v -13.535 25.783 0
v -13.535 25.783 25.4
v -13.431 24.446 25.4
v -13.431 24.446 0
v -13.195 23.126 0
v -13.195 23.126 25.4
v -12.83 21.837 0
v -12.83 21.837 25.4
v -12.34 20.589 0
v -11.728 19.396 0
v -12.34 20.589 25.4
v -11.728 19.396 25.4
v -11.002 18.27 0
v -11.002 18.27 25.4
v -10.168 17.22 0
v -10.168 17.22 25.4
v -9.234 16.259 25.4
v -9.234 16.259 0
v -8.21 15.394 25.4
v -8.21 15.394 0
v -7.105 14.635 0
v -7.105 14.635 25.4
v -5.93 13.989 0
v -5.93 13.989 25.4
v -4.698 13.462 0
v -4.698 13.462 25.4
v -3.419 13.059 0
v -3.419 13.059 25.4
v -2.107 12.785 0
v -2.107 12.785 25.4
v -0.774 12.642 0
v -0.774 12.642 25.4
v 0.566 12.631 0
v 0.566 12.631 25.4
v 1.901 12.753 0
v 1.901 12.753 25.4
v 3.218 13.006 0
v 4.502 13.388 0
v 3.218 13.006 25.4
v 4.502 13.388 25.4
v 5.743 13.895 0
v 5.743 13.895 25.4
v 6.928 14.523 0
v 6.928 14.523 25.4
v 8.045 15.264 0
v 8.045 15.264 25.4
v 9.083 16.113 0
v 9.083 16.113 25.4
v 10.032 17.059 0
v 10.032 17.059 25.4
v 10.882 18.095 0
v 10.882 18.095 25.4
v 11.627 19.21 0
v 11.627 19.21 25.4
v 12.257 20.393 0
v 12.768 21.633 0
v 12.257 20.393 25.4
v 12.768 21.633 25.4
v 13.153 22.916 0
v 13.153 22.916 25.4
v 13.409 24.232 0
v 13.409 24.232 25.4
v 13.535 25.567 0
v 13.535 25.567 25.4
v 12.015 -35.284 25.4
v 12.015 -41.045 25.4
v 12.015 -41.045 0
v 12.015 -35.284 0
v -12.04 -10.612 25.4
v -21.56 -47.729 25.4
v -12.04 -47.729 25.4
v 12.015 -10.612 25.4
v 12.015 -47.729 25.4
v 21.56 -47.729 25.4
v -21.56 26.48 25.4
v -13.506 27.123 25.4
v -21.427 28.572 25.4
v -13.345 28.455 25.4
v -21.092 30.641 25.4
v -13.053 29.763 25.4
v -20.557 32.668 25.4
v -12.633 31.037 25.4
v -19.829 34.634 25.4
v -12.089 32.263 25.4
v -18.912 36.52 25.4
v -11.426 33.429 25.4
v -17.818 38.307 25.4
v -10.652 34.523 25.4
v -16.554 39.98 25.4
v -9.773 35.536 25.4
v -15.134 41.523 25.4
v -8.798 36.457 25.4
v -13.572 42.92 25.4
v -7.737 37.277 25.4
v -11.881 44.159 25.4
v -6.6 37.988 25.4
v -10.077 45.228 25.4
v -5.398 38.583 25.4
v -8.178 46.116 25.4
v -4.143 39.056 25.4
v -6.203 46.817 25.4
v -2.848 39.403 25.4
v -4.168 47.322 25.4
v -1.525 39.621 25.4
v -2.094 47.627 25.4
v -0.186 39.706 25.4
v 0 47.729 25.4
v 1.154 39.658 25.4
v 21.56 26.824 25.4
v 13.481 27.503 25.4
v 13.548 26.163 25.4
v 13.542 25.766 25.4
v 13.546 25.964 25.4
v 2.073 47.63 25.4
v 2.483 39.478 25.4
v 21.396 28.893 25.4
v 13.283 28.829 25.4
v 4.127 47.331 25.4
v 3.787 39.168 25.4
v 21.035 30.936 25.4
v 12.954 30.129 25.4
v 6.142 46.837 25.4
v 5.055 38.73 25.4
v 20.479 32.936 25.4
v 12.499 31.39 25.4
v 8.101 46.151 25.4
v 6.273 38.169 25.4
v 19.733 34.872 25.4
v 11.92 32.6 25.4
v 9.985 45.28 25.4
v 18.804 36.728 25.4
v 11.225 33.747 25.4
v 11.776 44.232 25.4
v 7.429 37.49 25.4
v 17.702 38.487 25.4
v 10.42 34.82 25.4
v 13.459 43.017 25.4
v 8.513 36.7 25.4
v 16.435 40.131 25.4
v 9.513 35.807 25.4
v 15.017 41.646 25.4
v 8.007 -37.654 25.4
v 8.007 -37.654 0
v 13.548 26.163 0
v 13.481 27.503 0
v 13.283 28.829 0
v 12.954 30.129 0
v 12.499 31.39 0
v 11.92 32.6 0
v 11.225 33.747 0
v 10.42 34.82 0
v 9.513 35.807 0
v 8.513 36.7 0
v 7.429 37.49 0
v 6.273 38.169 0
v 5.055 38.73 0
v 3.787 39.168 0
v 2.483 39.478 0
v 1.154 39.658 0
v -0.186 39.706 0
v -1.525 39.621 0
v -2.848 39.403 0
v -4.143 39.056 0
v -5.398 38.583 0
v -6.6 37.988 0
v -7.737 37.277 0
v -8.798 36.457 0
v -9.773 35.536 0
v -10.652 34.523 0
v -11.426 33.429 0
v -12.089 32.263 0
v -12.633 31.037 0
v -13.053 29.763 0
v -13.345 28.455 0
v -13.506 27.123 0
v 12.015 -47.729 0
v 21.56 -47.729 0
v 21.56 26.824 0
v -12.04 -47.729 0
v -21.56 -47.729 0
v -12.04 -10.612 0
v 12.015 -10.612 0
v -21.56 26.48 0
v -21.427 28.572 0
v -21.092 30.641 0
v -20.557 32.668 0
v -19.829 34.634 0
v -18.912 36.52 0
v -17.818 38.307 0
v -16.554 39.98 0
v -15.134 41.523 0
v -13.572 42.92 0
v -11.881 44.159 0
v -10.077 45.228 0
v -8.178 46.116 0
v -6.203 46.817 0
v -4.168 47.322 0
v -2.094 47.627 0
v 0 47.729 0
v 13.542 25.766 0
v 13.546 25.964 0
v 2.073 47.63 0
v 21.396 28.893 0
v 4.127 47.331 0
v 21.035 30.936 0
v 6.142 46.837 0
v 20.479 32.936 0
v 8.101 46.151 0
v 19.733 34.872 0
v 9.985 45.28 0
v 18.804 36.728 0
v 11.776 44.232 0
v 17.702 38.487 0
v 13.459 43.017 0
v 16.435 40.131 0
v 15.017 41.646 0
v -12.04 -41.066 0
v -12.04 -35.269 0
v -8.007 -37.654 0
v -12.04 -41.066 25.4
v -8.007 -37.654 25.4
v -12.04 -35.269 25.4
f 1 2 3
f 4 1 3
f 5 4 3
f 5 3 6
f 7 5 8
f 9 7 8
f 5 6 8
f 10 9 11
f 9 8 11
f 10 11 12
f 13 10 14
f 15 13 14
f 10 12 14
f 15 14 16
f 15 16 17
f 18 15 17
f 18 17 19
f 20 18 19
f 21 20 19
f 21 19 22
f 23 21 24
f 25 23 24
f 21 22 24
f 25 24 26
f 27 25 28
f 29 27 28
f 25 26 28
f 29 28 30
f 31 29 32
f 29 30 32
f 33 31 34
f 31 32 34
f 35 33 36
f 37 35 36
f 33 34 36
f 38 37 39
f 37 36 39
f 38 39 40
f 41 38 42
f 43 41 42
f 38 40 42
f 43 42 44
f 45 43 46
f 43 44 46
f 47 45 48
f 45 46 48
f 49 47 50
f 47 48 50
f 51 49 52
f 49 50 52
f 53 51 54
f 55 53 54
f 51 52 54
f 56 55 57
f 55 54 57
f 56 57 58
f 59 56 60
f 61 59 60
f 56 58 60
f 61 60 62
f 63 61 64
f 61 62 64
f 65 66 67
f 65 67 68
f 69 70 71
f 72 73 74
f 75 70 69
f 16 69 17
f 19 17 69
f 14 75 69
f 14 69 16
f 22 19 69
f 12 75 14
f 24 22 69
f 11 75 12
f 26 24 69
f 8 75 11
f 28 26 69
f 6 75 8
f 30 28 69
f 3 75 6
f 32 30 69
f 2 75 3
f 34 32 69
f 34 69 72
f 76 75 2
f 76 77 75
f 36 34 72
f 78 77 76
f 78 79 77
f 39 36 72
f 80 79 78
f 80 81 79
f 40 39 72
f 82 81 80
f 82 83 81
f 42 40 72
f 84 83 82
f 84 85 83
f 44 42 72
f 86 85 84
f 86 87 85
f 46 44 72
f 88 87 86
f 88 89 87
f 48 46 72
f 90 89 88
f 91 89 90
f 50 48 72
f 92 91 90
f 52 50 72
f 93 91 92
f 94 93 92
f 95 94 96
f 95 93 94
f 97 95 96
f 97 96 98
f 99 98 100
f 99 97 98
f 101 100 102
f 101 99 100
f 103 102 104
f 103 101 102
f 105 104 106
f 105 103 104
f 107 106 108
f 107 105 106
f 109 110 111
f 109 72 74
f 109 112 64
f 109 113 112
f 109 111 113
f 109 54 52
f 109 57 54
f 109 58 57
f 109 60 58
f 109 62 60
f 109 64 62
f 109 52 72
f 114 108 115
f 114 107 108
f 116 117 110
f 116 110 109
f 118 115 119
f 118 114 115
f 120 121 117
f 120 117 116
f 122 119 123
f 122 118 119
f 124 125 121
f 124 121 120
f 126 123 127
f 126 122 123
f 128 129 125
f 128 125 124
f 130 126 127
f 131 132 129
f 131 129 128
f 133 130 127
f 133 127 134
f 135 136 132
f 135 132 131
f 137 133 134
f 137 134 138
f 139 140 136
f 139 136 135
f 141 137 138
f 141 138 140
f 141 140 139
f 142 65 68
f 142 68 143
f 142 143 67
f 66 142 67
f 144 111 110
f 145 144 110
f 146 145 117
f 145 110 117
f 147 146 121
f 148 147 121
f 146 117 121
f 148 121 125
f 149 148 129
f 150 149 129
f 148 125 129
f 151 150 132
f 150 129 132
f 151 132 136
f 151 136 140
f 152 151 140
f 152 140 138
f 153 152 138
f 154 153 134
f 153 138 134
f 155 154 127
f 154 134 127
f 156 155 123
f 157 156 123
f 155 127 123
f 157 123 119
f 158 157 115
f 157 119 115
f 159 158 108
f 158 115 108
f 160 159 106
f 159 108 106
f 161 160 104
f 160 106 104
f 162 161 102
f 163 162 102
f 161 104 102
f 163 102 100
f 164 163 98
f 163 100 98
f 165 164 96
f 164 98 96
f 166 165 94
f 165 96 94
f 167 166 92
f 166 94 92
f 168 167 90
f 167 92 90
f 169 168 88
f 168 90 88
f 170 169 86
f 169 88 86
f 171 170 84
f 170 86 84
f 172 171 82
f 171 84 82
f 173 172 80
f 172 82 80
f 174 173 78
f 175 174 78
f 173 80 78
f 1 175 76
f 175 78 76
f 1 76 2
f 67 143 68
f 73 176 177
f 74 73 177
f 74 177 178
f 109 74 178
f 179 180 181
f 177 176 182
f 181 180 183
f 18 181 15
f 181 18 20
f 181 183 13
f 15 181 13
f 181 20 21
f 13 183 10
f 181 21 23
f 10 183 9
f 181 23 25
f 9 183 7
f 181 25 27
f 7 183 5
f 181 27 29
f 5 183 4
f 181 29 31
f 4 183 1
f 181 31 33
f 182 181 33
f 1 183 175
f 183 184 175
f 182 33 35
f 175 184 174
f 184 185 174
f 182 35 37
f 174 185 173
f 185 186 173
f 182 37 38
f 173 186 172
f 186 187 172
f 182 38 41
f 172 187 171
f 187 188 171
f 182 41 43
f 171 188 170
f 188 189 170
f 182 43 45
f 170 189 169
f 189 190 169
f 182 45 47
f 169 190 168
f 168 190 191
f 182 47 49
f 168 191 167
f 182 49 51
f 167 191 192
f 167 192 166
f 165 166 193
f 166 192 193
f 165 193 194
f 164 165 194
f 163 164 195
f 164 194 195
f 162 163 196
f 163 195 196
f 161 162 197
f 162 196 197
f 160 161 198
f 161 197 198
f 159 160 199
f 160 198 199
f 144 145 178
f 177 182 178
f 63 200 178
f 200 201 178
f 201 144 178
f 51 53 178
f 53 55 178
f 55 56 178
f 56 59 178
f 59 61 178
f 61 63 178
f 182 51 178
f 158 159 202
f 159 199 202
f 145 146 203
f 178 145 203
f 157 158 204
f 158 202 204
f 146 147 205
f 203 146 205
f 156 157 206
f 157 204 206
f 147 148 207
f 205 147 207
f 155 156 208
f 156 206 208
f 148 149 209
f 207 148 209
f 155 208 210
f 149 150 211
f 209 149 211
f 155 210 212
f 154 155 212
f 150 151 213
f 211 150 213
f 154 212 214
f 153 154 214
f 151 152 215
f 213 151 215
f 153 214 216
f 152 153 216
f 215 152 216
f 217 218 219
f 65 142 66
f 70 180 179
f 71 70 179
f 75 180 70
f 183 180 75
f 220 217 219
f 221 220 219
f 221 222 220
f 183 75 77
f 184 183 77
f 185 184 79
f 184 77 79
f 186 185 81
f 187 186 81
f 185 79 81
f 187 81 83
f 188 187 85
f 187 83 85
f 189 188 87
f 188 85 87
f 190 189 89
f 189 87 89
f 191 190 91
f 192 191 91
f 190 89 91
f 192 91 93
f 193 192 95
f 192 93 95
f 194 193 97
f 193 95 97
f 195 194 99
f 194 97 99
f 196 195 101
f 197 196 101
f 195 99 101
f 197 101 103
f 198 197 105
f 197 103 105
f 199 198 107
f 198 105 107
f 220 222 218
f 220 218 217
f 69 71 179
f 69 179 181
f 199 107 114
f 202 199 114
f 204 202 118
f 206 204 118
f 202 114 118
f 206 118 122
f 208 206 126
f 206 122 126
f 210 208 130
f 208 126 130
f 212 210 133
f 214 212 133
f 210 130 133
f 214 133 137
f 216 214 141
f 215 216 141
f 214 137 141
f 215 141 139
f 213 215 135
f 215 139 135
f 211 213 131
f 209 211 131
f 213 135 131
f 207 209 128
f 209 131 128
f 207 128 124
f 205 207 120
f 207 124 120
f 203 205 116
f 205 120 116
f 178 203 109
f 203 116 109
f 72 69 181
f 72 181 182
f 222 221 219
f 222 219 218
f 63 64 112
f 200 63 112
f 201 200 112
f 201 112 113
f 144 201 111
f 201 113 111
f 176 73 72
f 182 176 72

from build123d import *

# Parameters (mm, degrees)
F0_W     = 43.1191921234
F0_H     = 95.4580008984
F1_DEPTH = 25.4
F2_W     = 24.0557342768
F2_H     = 37.1173806489
F3_DEPTH = 25.4
F5_DEPTH = 25.4
F7_DEPTH = 25.4


with BuildPart() as f1:
    # F0 (on Top) → F1 (new body)
    with BuildSketch(Plane.XY):
        Rectangle(F0_W, F0_H)
    extrude(amount=F1_DEPTH)

    # F2 (on face) → F3 (cut)
    with BuildSketch(Plane.XY.offset(25.4)):
        with Locations((-0.0124685466, -29.1703101248)):
            Rectangle(F2_W, F2_H)
    extrude(amount=-F3_DEPTH, mode=Mode.SUBTRACT)

    # F4 (on face) → F5 (cut)
    with BuildSketch(Plane.XY.offset(25.4)):
        with BuildLine():
            Line((-21.5595960617, 47.7290004492), (-21.5595960617, 26.4798601785))
            ThreePointArc((-21.5595960617, 26.4798601785), (-15.1344515192, 41.5227064888), (0, 47.7290004492))
            Line((0, 47.7290004492), (-21.5595960617, 47.7290004492))
        make_face()
        with BuildLine():
            Line((21.5595960617, 47.7290004492), (0, 47.7290004492))
            ThreePointArc((0, 47.7290004492), (15.0165391551, 41.6455907019), (21.5595960617, 26.8235554615))
            Line((21.5595960617, 26.8235554615), (21.5595960617, 47.7290004492))
        make_face()
        with BuildLine():
            ThreePointArc((13.5477701598, 26.163185652), (-0.1864449052, 39.7057243609), (-13.5346324637, 25.7825455919))
            Line((-13.5346324637, 25.7825455919), (13.5346324637, 25.5667813763))
            ThreePointArc((13.5346324637, 25.5667813763), (13.5444853375, 25.8649111731), (13.5477701598, 26.163185652))
        make_face()
        with BuildLine():
            Line((13.5346324637, 25.5667813763), (-13.5346324637, 25.7825455919))
            ThreePointArc((-13.5346324637, 25.7825455919), (-0.1040584372, 12.6197396416), (13.5346324637, 25.5667813763))
        make_face()
    extrude(amount=-F5_DEPTH, mode=Mode.SUBTRACT)


with BuildPart() as f7:
    # F6 (on face) → F7 (new body)
    with BuildSketch(Plane.XY.offset(25.4)):
        Polygon((-12.040335685, -35.2688357234), (-12.040335685, -41.066378355), (-8.0067142844, -37.6541092992), align=None)
    extrude(amount=-F7_DEPTH)


with BuildPart() as f7b:
    # F6 (on face) → F7, piece 2 (new body)
    with BuildSketch(Plane.XY.offset(25.4)):
        Polygon((12.0153985918, -41.0452826539), (12.0153985918, -35.2835822213), (8.0067142844, -37.6541092992), align=None)
    extrude(amount=-F7_DEPTH)


solid = Compound([f1.part, f7.part, f7b.part])
